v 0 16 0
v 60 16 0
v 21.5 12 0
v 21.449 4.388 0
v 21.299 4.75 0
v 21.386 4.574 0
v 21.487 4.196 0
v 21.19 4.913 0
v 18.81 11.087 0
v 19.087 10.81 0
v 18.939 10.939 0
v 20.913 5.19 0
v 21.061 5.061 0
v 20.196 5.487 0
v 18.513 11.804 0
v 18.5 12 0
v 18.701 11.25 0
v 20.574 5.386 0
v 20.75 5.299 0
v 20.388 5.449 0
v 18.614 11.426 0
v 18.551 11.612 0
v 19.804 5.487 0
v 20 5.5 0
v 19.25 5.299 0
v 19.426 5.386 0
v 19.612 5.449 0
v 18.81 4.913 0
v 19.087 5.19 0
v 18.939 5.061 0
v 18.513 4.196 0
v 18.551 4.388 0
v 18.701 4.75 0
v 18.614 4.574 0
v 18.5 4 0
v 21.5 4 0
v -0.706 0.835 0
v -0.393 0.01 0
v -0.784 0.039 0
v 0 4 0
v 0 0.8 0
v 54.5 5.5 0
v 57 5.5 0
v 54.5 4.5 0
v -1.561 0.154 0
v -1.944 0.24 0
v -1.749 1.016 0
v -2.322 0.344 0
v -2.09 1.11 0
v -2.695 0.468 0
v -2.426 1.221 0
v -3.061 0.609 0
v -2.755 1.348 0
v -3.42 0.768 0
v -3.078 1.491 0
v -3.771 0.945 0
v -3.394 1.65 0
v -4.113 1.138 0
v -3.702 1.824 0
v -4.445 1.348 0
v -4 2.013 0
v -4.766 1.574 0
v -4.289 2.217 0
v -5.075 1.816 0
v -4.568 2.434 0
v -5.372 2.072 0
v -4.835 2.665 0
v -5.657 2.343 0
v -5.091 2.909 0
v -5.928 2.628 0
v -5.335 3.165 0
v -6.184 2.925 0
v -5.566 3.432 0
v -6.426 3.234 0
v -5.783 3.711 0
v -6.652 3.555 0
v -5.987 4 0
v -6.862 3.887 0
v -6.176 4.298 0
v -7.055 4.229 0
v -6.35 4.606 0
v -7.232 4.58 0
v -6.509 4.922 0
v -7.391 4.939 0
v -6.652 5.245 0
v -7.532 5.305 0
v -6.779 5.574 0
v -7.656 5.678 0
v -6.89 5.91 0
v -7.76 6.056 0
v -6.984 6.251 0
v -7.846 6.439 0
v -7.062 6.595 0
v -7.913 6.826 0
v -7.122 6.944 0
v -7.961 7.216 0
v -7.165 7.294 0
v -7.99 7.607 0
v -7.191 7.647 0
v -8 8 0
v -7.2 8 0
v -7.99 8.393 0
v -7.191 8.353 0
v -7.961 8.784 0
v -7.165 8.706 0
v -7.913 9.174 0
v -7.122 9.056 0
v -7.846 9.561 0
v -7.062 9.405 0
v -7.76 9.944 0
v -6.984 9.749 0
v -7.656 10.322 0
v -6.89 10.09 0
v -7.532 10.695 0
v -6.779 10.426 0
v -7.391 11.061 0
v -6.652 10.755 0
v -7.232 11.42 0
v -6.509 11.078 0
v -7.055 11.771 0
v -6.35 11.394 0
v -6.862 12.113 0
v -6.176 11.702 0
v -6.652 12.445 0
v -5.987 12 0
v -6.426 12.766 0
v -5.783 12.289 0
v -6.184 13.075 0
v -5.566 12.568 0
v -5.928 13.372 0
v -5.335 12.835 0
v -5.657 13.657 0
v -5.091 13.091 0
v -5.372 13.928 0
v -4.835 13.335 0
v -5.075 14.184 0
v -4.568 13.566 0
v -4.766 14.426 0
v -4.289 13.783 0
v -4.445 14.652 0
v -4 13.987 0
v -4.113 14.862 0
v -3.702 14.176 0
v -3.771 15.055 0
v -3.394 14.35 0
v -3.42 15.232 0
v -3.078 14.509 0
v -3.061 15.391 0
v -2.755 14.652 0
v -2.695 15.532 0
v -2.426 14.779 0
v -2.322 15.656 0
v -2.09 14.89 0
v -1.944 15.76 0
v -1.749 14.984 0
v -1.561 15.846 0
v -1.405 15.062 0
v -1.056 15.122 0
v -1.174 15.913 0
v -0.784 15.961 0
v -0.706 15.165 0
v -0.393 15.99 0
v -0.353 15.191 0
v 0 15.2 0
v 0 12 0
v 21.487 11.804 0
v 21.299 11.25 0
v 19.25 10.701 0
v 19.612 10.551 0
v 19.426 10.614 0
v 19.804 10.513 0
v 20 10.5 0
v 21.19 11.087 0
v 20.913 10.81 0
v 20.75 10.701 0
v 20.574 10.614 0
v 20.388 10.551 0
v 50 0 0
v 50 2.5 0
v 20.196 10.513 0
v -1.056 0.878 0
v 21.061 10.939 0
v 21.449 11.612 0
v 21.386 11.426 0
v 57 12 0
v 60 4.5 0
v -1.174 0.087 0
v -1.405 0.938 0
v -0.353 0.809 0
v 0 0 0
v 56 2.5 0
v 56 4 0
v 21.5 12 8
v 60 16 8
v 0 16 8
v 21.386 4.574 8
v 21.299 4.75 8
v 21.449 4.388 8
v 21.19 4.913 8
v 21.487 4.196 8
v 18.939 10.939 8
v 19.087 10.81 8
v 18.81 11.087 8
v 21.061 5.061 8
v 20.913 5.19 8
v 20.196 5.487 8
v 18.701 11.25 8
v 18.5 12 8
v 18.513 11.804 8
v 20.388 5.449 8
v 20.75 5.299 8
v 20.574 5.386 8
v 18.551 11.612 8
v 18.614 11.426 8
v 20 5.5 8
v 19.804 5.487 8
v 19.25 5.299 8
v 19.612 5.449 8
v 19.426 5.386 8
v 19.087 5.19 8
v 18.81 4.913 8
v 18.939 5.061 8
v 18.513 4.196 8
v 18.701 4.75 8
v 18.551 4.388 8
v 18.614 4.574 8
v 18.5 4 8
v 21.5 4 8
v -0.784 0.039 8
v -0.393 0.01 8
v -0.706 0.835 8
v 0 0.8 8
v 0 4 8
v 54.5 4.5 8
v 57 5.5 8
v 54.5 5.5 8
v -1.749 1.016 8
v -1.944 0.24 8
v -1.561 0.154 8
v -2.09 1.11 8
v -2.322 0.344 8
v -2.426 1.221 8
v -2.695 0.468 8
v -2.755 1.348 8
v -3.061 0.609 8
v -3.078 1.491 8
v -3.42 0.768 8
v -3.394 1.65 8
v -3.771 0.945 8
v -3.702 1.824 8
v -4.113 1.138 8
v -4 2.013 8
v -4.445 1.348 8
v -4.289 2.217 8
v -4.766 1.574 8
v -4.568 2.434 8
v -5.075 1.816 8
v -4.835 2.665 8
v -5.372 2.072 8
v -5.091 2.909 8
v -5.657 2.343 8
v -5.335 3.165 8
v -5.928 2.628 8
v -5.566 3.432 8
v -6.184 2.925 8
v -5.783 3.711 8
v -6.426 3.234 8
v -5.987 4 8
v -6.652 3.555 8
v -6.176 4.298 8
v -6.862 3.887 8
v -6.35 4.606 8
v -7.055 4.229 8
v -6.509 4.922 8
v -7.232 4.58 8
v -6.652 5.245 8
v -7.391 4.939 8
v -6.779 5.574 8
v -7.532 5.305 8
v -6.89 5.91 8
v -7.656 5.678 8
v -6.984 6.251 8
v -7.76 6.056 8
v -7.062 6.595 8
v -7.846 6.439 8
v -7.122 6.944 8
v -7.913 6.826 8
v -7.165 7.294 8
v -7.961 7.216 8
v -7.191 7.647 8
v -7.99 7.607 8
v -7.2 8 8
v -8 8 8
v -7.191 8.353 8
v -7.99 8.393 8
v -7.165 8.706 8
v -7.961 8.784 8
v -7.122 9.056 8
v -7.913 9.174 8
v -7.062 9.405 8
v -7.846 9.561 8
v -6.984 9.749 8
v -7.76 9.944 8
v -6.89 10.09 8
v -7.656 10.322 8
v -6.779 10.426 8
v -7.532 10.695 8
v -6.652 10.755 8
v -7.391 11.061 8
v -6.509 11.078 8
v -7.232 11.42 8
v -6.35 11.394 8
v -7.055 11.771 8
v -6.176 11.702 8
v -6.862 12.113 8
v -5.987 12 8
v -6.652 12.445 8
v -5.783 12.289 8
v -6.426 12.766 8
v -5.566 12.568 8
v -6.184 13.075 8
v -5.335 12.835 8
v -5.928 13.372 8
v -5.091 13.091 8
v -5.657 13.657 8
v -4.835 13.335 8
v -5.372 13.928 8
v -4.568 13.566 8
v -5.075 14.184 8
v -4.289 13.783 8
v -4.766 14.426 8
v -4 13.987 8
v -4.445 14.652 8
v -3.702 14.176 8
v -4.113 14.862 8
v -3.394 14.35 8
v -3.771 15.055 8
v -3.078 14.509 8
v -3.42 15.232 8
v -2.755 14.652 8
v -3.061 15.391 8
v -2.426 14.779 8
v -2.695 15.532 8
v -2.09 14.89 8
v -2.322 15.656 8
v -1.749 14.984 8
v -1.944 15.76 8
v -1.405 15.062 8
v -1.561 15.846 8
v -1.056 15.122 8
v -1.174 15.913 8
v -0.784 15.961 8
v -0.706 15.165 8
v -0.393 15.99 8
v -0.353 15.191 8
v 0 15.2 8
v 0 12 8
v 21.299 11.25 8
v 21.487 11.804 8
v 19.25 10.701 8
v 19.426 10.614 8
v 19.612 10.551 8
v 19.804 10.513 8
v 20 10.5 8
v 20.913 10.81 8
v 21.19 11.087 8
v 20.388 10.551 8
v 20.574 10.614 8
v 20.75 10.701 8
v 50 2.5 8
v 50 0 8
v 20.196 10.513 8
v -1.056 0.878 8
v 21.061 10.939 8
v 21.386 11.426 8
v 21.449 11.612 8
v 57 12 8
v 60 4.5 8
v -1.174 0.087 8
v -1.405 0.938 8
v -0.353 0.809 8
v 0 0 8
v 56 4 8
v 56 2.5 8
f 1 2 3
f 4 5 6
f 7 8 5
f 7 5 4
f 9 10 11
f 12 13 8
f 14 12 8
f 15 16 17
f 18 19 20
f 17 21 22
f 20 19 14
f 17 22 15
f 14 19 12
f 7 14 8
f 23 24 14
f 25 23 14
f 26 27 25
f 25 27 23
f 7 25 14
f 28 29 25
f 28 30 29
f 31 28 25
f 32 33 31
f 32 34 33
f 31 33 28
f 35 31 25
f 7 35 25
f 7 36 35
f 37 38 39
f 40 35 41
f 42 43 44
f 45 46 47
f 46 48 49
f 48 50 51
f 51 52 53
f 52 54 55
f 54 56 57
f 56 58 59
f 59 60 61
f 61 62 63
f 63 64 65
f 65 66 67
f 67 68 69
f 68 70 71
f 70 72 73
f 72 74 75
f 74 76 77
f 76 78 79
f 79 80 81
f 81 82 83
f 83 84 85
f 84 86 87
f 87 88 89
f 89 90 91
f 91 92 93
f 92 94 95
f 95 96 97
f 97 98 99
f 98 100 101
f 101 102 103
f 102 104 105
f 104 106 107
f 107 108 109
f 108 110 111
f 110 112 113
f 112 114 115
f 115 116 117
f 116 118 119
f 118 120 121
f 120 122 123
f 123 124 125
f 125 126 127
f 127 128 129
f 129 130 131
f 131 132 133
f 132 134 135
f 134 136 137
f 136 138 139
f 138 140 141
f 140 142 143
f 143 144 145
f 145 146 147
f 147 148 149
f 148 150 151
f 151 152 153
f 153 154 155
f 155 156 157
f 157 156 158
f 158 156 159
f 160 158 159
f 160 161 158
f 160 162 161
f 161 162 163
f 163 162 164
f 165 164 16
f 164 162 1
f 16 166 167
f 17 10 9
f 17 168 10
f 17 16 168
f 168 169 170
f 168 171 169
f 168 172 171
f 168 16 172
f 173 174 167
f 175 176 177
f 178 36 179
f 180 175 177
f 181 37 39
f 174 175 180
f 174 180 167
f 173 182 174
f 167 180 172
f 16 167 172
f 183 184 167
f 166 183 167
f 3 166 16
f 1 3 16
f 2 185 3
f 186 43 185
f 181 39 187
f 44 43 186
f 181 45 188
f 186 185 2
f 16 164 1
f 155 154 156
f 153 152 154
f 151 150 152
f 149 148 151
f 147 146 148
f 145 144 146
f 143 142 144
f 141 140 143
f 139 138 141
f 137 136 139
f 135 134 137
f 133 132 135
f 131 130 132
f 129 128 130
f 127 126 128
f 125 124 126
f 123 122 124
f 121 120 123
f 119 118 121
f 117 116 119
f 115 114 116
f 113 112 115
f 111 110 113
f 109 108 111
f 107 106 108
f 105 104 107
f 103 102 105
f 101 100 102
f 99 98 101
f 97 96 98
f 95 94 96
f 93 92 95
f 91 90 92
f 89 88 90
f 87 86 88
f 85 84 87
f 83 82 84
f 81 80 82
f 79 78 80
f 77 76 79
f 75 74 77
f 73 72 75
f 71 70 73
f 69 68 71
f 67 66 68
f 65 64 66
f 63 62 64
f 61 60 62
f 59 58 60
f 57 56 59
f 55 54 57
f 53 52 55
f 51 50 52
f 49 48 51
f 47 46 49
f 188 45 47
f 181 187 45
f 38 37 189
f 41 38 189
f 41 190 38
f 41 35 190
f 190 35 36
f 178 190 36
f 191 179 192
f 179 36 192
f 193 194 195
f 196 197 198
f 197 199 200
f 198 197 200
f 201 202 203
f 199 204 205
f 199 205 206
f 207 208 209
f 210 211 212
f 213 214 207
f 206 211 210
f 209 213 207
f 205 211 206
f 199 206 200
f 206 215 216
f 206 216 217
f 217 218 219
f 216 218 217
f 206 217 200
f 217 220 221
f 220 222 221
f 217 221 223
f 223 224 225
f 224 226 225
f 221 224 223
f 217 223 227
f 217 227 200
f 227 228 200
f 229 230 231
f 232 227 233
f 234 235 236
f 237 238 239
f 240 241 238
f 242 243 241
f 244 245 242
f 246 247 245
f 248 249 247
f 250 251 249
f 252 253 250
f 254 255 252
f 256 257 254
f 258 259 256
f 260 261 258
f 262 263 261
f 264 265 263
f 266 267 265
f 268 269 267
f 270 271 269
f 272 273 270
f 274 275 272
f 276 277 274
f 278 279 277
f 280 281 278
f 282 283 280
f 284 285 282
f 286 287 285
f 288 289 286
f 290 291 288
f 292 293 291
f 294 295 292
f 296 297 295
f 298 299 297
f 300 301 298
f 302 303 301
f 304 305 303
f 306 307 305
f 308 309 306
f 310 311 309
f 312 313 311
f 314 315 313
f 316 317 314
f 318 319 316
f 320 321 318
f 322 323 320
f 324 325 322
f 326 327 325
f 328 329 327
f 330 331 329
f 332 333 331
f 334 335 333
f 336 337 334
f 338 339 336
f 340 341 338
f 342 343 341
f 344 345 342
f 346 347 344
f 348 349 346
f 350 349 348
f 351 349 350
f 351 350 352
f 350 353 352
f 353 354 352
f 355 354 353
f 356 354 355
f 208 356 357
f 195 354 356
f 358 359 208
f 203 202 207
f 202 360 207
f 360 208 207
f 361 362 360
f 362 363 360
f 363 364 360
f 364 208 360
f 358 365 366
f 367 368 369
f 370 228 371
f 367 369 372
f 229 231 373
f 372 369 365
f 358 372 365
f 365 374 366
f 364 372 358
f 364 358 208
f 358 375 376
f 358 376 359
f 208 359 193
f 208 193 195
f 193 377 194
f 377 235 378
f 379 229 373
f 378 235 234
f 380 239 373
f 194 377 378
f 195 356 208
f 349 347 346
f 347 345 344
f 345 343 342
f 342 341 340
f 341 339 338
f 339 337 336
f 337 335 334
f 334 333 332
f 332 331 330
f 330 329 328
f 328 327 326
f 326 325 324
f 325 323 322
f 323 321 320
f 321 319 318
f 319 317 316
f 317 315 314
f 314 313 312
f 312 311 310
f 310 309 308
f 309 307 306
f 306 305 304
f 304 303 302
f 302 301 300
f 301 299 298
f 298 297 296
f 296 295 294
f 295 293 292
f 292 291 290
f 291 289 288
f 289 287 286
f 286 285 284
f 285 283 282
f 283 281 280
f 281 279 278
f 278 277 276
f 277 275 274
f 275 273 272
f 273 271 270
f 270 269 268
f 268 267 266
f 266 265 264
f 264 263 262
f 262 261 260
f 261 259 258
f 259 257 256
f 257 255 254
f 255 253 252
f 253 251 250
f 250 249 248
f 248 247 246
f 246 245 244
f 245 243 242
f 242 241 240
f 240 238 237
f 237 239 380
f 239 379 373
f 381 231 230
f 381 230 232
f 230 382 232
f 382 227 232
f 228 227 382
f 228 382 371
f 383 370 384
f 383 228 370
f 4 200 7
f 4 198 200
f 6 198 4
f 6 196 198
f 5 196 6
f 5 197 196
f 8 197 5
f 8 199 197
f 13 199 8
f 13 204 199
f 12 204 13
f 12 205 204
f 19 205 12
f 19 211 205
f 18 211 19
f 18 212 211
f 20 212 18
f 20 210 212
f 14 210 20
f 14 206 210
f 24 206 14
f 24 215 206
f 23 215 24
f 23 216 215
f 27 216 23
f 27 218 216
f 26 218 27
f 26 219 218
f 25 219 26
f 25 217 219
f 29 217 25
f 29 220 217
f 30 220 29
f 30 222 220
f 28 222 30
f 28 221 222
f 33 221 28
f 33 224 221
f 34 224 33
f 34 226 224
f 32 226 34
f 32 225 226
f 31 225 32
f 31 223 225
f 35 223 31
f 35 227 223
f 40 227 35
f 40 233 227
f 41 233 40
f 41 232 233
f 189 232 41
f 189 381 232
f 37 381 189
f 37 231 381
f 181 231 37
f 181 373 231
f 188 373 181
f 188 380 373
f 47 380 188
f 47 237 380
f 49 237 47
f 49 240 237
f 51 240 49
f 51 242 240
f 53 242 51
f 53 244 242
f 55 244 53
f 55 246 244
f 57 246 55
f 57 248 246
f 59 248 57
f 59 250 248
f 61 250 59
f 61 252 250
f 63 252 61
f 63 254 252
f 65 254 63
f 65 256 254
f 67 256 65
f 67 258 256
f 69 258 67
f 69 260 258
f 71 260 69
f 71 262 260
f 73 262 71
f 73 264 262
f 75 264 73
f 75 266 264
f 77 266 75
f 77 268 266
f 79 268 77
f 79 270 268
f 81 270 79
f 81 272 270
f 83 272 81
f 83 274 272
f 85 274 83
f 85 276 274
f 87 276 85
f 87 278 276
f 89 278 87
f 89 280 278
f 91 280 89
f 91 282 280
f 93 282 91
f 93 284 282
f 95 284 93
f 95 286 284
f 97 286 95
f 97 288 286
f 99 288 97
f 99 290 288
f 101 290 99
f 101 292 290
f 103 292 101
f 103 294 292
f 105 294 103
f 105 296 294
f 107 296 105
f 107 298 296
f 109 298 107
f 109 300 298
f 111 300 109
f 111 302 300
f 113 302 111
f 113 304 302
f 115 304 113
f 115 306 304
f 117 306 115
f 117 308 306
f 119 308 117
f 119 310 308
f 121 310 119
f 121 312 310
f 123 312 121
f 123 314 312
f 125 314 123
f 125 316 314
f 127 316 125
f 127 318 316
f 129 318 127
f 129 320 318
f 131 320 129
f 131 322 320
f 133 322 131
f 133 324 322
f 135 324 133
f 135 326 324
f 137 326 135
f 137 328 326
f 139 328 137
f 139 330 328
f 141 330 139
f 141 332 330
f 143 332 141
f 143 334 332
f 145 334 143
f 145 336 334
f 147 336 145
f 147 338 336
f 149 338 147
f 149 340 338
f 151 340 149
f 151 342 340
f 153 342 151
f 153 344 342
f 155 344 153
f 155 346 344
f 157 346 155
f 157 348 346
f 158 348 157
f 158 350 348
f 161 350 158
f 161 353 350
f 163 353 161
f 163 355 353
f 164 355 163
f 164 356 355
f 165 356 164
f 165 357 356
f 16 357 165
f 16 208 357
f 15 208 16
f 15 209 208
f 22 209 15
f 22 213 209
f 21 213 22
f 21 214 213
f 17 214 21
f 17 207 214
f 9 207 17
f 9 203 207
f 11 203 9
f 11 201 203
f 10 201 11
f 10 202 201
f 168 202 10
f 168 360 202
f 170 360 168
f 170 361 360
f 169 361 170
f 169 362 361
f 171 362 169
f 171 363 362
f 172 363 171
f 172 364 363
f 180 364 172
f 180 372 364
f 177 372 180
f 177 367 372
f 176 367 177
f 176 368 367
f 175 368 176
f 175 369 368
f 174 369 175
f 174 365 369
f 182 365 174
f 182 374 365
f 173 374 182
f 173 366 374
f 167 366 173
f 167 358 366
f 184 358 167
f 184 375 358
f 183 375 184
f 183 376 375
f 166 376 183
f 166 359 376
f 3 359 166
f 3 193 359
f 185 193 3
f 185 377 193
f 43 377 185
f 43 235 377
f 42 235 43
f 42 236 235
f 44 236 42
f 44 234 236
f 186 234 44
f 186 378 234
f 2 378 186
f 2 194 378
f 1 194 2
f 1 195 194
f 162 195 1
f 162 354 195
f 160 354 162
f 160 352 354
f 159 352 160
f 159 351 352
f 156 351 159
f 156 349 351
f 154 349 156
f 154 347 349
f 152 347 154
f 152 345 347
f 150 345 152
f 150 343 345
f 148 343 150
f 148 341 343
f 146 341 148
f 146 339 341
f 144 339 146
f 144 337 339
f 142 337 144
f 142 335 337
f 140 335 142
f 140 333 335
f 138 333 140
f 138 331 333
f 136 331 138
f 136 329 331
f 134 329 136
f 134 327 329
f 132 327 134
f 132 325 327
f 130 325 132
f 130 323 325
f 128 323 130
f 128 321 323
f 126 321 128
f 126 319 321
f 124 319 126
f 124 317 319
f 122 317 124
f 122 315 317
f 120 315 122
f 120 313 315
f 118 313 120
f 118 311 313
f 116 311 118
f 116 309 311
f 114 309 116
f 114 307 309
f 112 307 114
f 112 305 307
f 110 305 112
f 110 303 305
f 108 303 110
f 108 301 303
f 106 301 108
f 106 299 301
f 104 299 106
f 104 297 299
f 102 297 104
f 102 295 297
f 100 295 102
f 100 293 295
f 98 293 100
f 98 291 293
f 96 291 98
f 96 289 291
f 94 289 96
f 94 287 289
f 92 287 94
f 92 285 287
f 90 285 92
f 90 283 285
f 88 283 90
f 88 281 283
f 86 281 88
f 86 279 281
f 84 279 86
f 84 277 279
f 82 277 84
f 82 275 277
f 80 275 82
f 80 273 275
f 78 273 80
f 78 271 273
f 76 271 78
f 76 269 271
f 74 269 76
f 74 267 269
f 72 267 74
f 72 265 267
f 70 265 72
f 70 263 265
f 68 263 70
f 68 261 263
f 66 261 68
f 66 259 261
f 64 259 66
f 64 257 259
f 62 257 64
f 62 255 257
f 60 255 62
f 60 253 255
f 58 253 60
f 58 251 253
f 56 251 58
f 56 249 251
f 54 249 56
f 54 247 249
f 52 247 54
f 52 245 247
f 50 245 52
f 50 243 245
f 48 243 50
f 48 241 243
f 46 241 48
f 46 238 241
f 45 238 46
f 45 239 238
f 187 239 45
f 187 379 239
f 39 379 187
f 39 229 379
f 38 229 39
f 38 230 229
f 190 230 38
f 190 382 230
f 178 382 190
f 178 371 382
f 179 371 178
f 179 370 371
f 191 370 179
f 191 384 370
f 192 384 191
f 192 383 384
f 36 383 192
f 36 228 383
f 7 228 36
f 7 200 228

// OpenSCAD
// KNOWN-WRONG PART (must fail): the ridges are at x = 20 instead of 27.5
// Pinch clamp for silicone tubing (up to 6.4 mm OD) with a living hinge and a snap latch
// Category: quick fixes. One flat profile: two jaws joined by a 0.8 mm half-ring hinge, a
// half-round pinch ridge on each jaw, and a hook on the upper jaw whose nose snaps under the
// lower jaw's thin tongue when the jaws are squeezed together.
// Print: PETG or PP (PLA hinges crack), lying flat, 0.2 mm layers, 100 % infill.
// SPDX-License-Identifier: CERN-OHL-P-2.0

/* [Clamp] */
thickness = 8;            // extrusion along Z
lower_jaw = [50, 4];      // x 0..50, y 0..4
tongue = [50, 56, 2.5];   // x from, x to, y bottom (top at y = 4)
upper_jaw = [60, 12, 16]; // x 0..60, y 12..16
hinge_c = [0, 8];         // half-ring on the x < 0 side
hinge_r = [7.2, 8];       // inner, outer radius (0.8 mm thick)
ridge_x = 20;  
ridge_r = 1.5;
leg = [57, 60, 4.5, 12];  // hook leg x from, x to, y from, y to
nose = [54.5, 57, 4.5, 5.5];

/* [Hidden] */
eps = 0.01;

linear_extrude(thickness) union() {
    square(lower_jaw);
    translate([tongue[0], tongue[2]]) square([tongue[1] - tongue[0], lower_jaw.y - tongue[2]]);
    translate([0, upper_jaw[1]]) square([upper_jaw[0], upper_jaw[2] - upper_jaw[1]]);
    intersection() {
        translate(hinge_c) difference() { circle(r = hinge_r[1], $fn = 128); circle(r = hinge_r[0], $fn = 128); }
        translate([-hinge_r[1] - 1, -1]) square([hinge_r[1] + 1 + eps, 2 * hinge_r[1] + 2]);
    }
    translate([ridge_x, lower_jaw.y]) circle(r = ridge_r, $fn = 48);
    translate([ridge_x, upper_jaw[1]]) circle(r = ridge_r, $fn = 48);
    translate([leg[0], leg[2]]) square([leg[1] - leg[0], leg[3] - leg[2] + eps]);
    translate([nose[0], nose[2]]) square([nose[1] - nose[0] + eps, nose[3] - nose[2]]);
}
